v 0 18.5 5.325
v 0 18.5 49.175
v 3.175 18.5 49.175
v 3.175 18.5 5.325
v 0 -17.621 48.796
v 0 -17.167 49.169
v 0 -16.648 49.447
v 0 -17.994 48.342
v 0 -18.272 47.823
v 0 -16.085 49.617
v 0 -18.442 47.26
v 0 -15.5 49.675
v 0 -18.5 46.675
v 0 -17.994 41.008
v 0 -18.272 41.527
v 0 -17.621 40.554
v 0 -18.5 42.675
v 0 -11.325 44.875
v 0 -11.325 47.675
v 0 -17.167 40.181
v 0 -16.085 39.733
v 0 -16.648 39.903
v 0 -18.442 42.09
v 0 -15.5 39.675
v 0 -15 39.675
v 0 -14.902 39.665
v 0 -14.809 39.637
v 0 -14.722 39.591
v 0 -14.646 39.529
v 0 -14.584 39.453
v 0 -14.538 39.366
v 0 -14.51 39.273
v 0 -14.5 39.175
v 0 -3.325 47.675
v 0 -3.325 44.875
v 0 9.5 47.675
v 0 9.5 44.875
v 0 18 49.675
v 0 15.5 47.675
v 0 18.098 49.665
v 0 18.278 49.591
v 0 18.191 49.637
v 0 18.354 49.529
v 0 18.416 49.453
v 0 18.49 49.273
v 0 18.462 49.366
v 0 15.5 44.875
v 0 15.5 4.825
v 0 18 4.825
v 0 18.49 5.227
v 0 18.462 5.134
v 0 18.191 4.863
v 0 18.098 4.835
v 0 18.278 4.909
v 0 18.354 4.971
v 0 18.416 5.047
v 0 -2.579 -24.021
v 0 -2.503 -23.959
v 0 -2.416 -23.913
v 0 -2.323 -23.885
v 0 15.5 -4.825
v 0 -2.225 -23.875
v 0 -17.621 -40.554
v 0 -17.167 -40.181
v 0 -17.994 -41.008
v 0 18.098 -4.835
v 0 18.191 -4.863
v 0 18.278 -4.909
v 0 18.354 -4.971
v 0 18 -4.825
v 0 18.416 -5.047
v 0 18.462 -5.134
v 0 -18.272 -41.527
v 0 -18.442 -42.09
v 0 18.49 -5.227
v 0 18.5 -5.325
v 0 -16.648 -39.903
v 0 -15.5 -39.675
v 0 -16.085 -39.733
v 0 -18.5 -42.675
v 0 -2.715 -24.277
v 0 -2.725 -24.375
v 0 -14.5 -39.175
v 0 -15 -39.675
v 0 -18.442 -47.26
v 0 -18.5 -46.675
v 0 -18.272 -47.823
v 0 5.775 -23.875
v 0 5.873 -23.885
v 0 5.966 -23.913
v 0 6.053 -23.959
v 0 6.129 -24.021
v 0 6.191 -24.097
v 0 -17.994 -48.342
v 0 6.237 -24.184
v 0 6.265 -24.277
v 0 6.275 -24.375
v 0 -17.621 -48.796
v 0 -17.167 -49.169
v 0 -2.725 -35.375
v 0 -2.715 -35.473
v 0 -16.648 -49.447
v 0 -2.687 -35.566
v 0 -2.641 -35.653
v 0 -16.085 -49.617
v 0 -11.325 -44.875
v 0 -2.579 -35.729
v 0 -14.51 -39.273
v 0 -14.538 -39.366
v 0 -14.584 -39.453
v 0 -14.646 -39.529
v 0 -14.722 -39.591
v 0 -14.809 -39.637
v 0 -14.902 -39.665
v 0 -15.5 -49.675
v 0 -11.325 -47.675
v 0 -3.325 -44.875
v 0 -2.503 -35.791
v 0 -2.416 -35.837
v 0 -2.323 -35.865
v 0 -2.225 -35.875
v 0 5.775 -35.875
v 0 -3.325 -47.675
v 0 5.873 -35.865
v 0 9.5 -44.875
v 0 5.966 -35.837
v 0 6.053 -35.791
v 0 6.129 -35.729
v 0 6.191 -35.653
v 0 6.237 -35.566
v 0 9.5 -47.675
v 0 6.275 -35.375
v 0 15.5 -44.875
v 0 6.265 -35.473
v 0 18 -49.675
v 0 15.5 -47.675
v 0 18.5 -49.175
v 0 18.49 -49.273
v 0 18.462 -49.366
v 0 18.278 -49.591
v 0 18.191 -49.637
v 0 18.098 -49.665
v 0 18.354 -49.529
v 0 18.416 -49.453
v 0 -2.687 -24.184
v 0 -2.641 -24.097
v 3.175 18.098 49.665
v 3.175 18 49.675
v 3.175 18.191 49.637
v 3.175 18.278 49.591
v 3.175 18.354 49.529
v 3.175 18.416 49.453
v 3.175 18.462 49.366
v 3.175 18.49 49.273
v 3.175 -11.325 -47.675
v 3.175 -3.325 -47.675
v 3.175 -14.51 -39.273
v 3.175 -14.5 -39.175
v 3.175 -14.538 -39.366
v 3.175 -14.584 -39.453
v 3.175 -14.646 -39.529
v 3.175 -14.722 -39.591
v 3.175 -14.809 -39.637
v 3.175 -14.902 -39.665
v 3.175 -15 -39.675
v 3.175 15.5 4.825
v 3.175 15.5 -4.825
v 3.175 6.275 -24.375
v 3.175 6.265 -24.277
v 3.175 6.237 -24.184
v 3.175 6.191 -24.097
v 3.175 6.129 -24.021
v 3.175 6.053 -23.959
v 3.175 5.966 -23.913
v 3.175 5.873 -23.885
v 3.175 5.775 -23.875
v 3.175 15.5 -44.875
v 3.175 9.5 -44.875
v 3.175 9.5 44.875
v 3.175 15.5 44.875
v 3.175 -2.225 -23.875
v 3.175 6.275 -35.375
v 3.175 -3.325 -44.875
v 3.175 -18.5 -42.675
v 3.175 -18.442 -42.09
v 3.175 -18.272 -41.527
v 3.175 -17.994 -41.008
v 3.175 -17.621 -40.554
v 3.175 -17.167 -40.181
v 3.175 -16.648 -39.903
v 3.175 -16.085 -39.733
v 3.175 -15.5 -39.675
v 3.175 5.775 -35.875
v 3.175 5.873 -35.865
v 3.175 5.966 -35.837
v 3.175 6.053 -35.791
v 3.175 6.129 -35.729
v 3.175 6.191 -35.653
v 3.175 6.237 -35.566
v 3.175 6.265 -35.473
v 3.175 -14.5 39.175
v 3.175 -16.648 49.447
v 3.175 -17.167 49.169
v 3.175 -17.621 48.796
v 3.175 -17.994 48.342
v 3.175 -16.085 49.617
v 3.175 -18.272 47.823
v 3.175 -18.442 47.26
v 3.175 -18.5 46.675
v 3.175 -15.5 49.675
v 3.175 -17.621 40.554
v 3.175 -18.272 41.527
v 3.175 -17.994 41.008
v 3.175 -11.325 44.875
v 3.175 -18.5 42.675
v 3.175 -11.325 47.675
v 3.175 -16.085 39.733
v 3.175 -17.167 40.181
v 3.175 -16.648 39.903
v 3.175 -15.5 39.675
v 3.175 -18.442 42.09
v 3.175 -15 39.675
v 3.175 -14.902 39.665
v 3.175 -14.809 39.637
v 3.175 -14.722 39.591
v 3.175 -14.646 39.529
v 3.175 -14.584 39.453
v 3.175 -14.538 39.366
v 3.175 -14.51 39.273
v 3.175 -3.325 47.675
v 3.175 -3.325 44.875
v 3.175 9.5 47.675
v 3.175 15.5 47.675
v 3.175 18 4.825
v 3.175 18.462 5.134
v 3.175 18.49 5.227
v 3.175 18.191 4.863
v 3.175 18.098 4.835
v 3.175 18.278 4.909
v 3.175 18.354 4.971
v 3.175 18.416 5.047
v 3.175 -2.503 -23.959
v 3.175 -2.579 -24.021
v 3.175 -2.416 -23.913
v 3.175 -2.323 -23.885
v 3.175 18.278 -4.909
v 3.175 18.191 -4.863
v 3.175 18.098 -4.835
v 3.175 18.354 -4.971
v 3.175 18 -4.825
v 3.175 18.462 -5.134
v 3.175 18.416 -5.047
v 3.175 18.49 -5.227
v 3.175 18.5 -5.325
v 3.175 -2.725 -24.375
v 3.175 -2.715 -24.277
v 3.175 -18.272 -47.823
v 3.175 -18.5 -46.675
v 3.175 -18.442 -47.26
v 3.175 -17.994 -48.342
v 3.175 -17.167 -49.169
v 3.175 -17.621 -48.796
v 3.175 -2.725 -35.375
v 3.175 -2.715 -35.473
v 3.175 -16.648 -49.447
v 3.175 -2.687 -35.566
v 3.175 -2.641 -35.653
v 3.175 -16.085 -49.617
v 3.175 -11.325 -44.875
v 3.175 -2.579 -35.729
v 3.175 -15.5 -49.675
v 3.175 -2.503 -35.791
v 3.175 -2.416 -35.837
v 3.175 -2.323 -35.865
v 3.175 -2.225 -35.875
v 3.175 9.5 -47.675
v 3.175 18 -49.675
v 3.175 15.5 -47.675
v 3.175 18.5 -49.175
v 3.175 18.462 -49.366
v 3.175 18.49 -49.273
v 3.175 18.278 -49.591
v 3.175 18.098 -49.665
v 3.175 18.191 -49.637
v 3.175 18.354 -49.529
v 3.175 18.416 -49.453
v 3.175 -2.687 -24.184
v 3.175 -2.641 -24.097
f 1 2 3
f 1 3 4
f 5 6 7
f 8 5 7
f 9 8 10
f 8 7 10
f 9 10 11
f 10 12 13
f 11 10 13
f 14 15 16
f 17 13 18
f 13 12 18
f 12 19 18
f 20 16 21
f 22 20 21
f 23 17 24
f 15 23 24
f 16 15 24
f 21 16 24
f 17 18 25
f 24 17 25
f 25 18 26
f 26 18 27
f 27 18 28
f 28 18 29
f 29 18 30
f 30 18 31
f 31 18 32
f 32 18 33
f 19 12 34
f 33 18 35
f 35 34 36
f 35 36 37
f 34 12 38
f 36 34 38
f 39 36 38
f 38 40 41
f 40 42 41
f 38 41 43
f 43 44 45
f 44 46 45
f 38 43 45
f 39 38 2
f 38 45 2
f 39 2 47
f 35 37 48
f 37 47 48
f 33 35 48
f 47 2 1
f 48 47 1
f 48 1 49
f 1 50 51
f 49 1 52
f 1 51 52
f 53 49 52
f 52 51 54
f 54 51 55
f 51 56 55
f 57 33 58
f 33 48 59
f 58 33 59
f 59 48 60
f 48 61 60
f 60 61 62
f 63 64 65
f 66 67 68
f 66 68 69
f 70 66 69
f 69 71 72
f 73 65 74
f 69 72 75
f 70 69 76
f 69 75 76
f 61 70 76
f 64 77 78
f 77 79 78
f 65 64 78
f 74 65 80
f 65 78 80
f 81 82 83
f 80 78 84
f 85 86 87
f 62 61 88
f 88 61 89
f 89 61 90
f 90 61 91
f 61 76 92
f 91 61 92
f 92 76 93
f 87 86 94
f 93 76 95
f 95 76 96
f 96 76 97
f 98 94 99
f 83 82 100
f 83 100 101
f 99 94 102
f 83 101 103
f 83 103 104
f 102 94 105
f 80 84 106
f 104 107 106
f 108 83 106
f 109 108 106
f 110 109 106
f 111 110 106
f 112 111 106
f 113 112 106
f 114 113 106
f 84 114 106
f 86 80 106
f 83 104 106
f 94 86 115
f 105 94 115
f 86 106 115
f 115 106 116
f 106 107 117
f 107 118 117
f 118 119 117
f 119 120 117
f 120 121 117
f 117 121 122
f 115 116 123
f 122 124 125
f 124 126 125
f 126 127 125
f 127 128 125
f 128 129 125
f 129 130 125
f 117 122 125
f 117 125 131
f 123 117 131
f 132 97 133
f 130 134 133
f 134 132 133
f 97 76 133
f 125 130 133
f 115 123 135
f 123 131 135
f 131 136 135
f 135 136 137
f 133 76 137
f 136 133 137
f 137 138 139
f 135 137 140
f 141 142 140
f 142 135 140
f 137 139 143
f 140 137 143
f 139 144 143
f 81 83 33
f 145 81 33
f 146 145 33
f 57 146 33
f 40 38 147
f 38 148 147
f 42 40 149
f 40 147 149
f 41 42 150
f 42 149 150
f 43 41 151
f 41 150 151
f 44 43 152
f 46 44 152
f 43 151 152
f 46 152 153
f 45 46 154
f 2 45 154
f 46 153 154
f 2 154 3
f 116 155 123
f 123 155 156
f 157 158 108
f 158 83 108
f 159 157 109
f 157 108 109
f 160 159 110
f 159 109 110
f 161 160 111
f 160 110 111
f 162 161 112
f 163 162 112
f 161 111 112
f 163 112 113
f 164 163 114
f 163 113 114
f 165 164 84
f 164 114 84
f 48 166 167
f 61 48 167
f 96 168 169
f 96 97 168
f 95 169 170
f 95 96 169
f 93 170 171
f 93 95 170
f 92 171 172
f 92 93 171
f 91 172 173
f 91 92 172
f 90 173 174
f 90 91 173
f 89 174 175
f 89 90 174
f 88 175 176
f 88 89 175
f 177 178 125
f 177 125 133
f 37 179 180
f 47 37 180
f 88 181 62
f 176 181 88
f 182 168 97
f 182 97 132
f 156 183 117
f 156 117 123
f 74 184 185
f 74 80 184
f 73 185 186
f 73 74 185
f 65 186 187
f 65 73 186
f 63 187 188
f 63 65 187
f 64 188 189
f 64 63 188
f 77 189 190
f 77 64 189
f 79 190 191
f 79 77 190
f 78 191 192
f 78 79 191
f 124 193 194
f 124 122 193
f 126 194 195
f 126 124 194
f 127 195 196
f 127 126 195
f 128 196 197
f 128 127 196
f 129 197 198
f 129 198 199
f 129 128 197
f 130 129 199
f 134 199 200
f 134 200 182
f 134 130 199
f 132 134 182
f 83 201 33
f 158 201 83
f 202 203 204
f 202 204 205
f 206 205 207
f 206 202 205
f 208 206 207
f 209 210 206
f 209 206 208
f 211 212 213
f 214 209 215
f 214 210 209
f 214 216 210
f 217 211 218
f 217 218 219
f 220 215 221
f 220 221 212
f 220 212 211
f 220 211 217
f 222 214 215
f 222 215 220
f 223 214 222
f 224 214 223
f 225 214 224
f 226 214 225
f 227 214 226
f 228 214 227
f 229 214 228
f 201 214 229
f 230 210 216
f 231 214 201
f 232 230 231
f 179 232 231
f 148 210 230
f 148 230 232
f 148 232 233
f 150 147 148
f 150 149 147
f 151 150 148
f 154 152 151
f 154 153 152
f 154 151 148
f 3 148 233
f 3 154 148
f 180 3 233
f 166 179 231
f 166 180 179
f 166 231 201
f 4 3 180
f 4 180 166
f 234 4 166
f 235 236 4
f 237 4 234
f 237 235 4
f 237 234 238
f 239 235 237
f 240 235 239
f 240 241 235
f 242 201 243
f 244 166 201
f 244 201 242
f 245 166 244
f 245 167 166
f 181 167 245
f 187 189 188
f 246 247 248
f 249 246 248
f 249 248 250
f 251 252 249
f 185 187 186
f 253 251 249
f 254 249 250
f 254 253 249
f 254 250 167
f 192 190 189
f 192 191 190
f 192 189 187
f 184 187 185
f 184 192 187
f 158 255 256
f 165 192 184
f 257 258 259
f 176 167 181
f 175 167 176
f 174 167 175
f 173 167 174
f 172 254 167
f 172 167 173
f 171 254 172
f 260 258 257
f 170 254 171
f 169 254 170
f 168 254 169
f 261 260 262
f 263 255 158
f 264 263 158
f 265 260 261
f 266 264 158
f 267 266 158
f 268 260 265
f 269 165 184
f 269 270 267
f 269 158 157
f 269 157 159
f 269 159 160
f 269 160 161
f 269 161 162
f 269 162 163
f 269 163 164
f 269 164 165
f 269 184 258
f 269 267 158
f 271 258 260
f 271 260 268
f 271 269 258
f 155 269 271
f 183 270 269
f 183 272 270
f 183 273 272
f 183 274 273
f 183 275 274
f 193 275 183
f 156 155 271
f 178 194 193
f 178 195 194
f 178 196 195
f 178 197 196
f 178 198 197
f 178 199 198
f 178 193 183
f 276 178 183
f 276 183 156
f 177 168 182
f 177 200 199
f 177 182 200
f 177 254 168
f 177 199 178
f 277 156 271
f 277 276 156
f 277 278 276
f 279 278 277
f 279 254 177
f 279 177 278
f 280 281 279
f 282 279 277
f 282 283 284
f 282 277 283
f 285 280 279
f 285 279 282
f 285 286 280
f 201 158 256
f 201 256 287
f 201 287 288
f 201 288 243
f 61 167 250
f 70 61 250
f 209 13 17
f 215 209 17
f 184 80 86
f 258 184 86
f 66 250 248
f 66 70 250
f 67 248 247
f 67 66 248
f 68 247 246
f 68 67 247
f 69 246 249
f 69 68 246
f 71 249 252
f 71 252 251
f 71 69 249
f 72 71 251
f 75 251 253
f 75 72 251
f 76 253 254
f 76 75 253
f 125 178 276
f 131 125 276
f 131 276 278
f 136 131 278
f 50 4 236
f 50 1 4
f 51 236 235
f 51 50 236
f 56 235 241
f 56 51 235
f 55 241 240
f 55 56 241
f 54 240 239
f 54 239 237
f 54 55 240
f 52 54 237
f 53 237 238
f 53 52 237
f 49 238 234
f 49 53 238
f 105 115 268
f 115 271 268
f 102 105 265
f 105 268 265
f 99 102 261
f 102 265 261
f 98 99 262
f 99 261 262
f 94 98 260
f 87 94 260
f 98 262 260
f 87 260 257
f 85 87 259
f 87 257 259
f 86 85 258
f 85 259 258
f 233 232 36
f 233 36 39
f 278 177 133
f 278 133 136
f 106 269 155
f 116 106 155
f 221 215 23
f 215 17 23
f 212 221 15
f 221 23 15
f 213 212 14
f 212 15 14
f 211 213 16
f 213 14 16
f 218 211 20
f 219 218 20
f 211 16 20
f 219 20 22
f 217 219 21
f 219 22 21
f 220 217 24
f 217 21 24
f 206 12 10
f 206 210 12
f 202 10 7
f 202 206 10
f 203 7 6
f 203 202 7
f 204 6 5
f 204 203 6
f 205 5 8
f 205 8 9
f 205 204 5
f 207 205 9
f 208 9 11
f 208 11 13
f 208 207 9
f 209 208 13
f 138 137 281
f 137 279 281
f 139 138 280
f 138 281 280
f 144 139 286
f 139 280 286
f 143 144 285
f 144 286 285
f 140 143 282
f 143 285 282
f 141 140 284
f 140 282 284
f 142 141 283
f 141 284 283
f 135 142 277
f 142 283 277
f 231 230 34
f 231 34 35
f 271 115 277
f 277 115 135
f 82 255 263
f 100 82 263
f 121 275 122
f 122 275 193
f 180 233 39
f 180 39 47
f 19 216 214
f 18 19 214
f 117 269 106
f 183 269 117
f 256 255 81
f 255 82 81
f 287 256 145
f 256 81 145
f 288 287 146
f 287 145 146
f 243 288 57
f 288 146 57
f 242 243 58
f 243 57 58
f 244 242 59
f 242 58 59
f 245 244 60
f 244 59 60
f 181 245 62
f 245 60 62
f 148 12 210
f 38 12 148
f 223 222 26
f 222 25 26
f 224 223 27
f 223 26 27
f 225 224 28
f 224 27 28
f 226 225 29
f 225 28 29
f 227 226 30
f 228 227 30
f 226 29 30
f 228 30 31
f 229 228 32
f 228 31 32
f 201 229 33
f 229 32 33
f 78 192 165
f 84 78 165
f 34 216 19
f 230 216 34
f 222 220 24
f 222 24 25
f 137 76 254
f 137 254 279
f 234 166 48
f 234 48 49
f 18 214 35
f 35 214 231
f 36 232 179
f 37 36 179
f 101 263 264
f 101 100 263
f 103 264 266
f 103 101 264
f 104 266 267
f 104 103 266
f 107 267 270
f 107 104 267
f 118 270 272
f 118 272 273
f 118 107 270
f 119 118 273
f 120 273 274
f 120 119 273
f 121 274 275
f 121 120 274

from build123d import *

# Parameters (mm, degrees)
SKETCH1_W           = 99.35
SKETCH1_H           = 37
BOSS_EXTRUDE1_DEPTH = 3.175
SKETCH2_W           = 2.8
SKETCH2_H           = 6
SKETCH2_H_2         = 8
CUT_EXTRUDE1_DEPTH  = 54.103071945
SKETCH3_W           = 79.35
SKETCH3_H           = 4
CUT_EXTRUDE2_DEPTH  = 54.103071945
FILLET1_R           = 3
FILLET2_R           = 0.5
SKETCH4_W           = 9.65
SKETCH4_H           = 3
CUT_EXTRUDE3_DEPTH  = 54.103071945
SKETCH5_W           = 12
SKETCH5_H           = 9
CUT_EXTRUDE4_DEPTH  = 54.103071945
FILLET3_R           = 0.5
FILLET4_R           = 0.5


with BuildPart() as part:
    # Sketch1 → Boss-Extrude1 (new body)
    with BuildSketch(Plane(origin=(0, 0, 0), x_dir=(0, 0, -1), z_dir=(1, 0, 0))):
        Rectangle(SKETCH1_W, SKETCH1_H)
    extrude(amount=BOSS_EXTRUDE1_DEPTH)

    # Sketch2 → Cut-Extrude1 (cut, through all)
    with BuildSketch(Plane(origin=(3.175, 0, 0), x_dir=(0, 0, -1), z_dir=(1, 0, 0))):
        with Locations((-46.275, 12.5)):
            Rectangle(SKETCH2_W, SKETCH2_H)
        with Locations((46.275, 12.5)):
            Rectangle(SKETCH2_W, SKETCH2_H)
        with Locations((-46.275, -7.325)):
            Rectangle(SKETCH2_W, SKETCH2_H_2)
        with Locations((46.275, -7.325)):
            Rectangle(SKETCH2_W, SKETCH2_H_2)
    extrude(amount=-CUT_EXTRUDE1_DEPTH, mode=Mode.SUBTRACT)

    # Sketch3 → Cut-Extrude2 (cut, through all)
    with BuildSketch(Plane(origin=(3.175, 0, 0), x_dir=(0, 0, -1), z_dir=(1, 0, 0))):
        with Locations((0, -16.5)):
            Rectangle(SKETCH3_W, SKETCH3_H)
    extrude(amount=-CUT_EXTRUDE2_DEPTH, mode=Mode.SUBTRACT)

    # Fillet1
    fillet1_edges = [part.edges().sort_by_distance(p)[0] for p in [
        (1.5875, -18.5, -49.675),
        (1.5875, -18.5, 49.675),
        (1.5875, -18.5, 39.675),
        (1.5875, -18.5, -39.675),
    ]]
    fillet(fillet1_edges, radius=FILLET1_R)

    # Fillet2
    fillet2_edges = [part.edges().sort_by_distance(p)[0] for p in [
        (1.5875, 18.5, 49.675),
        (1.5875, 18.5, -49.675),
        (1.5875, -14.5, 39.675),
        (1.5875, -14.5, -39.675),
    ]]
    fillet(fillet2_edges, radius=FILLET2_R)

    # Sketch4 → Cut-Extrude3 (cut, through all)
    with BuildSketch(Plane(origin=(3.175, 0, 0), x_dir=(0, 0, -1), z_dir=(1, 0, 0))):
        with Locations((0, 17)):
            Rectangle(SKETCH4_W, SKETCH4_H)
    extrude(amount=-CUT_EXTRUDE3_DEPTH, mode=Mode.SUBTRACT)

    # Sketch5 → Cut-Extrude4 (cut, through all)
    with BuildSketch(Plane(origin=(3.175, 0, 0), x_dir=(0, 0, -1), z_dir=(1, 0, 0))):
        with Locations((29.875, 1.775)):
            Rectangle(SKETCH5_W, SKETCH5_H)
    extrude(amount=-CUT_EXTRUDE4_DEPTH, mode=Mode.SUBTRACT)

    # Fillet3
    fillet3_edges = [part.edges().sort_by_distance(p)[0] for p in [
        (1.5875, -2.725, -23.875),
        (1.5875, 6.275, -23.875),
        (1.5875, 6.275, -35.875),
        (1.5875, -2.725, -35.875),
    ]]
    fillet(fillet3_edges, radius=FILLET3_R)

    # Fillet4
    fillet4_edges = [part.edges().sort_by_distance(p)[0] for p in [
        (1.5875, 18.5, 4.825),
        (1.5875, 18.5, -4.825),
    ]]
    fillet(fillet4_edges, radius=FILLET4_R)


solid = part.part
